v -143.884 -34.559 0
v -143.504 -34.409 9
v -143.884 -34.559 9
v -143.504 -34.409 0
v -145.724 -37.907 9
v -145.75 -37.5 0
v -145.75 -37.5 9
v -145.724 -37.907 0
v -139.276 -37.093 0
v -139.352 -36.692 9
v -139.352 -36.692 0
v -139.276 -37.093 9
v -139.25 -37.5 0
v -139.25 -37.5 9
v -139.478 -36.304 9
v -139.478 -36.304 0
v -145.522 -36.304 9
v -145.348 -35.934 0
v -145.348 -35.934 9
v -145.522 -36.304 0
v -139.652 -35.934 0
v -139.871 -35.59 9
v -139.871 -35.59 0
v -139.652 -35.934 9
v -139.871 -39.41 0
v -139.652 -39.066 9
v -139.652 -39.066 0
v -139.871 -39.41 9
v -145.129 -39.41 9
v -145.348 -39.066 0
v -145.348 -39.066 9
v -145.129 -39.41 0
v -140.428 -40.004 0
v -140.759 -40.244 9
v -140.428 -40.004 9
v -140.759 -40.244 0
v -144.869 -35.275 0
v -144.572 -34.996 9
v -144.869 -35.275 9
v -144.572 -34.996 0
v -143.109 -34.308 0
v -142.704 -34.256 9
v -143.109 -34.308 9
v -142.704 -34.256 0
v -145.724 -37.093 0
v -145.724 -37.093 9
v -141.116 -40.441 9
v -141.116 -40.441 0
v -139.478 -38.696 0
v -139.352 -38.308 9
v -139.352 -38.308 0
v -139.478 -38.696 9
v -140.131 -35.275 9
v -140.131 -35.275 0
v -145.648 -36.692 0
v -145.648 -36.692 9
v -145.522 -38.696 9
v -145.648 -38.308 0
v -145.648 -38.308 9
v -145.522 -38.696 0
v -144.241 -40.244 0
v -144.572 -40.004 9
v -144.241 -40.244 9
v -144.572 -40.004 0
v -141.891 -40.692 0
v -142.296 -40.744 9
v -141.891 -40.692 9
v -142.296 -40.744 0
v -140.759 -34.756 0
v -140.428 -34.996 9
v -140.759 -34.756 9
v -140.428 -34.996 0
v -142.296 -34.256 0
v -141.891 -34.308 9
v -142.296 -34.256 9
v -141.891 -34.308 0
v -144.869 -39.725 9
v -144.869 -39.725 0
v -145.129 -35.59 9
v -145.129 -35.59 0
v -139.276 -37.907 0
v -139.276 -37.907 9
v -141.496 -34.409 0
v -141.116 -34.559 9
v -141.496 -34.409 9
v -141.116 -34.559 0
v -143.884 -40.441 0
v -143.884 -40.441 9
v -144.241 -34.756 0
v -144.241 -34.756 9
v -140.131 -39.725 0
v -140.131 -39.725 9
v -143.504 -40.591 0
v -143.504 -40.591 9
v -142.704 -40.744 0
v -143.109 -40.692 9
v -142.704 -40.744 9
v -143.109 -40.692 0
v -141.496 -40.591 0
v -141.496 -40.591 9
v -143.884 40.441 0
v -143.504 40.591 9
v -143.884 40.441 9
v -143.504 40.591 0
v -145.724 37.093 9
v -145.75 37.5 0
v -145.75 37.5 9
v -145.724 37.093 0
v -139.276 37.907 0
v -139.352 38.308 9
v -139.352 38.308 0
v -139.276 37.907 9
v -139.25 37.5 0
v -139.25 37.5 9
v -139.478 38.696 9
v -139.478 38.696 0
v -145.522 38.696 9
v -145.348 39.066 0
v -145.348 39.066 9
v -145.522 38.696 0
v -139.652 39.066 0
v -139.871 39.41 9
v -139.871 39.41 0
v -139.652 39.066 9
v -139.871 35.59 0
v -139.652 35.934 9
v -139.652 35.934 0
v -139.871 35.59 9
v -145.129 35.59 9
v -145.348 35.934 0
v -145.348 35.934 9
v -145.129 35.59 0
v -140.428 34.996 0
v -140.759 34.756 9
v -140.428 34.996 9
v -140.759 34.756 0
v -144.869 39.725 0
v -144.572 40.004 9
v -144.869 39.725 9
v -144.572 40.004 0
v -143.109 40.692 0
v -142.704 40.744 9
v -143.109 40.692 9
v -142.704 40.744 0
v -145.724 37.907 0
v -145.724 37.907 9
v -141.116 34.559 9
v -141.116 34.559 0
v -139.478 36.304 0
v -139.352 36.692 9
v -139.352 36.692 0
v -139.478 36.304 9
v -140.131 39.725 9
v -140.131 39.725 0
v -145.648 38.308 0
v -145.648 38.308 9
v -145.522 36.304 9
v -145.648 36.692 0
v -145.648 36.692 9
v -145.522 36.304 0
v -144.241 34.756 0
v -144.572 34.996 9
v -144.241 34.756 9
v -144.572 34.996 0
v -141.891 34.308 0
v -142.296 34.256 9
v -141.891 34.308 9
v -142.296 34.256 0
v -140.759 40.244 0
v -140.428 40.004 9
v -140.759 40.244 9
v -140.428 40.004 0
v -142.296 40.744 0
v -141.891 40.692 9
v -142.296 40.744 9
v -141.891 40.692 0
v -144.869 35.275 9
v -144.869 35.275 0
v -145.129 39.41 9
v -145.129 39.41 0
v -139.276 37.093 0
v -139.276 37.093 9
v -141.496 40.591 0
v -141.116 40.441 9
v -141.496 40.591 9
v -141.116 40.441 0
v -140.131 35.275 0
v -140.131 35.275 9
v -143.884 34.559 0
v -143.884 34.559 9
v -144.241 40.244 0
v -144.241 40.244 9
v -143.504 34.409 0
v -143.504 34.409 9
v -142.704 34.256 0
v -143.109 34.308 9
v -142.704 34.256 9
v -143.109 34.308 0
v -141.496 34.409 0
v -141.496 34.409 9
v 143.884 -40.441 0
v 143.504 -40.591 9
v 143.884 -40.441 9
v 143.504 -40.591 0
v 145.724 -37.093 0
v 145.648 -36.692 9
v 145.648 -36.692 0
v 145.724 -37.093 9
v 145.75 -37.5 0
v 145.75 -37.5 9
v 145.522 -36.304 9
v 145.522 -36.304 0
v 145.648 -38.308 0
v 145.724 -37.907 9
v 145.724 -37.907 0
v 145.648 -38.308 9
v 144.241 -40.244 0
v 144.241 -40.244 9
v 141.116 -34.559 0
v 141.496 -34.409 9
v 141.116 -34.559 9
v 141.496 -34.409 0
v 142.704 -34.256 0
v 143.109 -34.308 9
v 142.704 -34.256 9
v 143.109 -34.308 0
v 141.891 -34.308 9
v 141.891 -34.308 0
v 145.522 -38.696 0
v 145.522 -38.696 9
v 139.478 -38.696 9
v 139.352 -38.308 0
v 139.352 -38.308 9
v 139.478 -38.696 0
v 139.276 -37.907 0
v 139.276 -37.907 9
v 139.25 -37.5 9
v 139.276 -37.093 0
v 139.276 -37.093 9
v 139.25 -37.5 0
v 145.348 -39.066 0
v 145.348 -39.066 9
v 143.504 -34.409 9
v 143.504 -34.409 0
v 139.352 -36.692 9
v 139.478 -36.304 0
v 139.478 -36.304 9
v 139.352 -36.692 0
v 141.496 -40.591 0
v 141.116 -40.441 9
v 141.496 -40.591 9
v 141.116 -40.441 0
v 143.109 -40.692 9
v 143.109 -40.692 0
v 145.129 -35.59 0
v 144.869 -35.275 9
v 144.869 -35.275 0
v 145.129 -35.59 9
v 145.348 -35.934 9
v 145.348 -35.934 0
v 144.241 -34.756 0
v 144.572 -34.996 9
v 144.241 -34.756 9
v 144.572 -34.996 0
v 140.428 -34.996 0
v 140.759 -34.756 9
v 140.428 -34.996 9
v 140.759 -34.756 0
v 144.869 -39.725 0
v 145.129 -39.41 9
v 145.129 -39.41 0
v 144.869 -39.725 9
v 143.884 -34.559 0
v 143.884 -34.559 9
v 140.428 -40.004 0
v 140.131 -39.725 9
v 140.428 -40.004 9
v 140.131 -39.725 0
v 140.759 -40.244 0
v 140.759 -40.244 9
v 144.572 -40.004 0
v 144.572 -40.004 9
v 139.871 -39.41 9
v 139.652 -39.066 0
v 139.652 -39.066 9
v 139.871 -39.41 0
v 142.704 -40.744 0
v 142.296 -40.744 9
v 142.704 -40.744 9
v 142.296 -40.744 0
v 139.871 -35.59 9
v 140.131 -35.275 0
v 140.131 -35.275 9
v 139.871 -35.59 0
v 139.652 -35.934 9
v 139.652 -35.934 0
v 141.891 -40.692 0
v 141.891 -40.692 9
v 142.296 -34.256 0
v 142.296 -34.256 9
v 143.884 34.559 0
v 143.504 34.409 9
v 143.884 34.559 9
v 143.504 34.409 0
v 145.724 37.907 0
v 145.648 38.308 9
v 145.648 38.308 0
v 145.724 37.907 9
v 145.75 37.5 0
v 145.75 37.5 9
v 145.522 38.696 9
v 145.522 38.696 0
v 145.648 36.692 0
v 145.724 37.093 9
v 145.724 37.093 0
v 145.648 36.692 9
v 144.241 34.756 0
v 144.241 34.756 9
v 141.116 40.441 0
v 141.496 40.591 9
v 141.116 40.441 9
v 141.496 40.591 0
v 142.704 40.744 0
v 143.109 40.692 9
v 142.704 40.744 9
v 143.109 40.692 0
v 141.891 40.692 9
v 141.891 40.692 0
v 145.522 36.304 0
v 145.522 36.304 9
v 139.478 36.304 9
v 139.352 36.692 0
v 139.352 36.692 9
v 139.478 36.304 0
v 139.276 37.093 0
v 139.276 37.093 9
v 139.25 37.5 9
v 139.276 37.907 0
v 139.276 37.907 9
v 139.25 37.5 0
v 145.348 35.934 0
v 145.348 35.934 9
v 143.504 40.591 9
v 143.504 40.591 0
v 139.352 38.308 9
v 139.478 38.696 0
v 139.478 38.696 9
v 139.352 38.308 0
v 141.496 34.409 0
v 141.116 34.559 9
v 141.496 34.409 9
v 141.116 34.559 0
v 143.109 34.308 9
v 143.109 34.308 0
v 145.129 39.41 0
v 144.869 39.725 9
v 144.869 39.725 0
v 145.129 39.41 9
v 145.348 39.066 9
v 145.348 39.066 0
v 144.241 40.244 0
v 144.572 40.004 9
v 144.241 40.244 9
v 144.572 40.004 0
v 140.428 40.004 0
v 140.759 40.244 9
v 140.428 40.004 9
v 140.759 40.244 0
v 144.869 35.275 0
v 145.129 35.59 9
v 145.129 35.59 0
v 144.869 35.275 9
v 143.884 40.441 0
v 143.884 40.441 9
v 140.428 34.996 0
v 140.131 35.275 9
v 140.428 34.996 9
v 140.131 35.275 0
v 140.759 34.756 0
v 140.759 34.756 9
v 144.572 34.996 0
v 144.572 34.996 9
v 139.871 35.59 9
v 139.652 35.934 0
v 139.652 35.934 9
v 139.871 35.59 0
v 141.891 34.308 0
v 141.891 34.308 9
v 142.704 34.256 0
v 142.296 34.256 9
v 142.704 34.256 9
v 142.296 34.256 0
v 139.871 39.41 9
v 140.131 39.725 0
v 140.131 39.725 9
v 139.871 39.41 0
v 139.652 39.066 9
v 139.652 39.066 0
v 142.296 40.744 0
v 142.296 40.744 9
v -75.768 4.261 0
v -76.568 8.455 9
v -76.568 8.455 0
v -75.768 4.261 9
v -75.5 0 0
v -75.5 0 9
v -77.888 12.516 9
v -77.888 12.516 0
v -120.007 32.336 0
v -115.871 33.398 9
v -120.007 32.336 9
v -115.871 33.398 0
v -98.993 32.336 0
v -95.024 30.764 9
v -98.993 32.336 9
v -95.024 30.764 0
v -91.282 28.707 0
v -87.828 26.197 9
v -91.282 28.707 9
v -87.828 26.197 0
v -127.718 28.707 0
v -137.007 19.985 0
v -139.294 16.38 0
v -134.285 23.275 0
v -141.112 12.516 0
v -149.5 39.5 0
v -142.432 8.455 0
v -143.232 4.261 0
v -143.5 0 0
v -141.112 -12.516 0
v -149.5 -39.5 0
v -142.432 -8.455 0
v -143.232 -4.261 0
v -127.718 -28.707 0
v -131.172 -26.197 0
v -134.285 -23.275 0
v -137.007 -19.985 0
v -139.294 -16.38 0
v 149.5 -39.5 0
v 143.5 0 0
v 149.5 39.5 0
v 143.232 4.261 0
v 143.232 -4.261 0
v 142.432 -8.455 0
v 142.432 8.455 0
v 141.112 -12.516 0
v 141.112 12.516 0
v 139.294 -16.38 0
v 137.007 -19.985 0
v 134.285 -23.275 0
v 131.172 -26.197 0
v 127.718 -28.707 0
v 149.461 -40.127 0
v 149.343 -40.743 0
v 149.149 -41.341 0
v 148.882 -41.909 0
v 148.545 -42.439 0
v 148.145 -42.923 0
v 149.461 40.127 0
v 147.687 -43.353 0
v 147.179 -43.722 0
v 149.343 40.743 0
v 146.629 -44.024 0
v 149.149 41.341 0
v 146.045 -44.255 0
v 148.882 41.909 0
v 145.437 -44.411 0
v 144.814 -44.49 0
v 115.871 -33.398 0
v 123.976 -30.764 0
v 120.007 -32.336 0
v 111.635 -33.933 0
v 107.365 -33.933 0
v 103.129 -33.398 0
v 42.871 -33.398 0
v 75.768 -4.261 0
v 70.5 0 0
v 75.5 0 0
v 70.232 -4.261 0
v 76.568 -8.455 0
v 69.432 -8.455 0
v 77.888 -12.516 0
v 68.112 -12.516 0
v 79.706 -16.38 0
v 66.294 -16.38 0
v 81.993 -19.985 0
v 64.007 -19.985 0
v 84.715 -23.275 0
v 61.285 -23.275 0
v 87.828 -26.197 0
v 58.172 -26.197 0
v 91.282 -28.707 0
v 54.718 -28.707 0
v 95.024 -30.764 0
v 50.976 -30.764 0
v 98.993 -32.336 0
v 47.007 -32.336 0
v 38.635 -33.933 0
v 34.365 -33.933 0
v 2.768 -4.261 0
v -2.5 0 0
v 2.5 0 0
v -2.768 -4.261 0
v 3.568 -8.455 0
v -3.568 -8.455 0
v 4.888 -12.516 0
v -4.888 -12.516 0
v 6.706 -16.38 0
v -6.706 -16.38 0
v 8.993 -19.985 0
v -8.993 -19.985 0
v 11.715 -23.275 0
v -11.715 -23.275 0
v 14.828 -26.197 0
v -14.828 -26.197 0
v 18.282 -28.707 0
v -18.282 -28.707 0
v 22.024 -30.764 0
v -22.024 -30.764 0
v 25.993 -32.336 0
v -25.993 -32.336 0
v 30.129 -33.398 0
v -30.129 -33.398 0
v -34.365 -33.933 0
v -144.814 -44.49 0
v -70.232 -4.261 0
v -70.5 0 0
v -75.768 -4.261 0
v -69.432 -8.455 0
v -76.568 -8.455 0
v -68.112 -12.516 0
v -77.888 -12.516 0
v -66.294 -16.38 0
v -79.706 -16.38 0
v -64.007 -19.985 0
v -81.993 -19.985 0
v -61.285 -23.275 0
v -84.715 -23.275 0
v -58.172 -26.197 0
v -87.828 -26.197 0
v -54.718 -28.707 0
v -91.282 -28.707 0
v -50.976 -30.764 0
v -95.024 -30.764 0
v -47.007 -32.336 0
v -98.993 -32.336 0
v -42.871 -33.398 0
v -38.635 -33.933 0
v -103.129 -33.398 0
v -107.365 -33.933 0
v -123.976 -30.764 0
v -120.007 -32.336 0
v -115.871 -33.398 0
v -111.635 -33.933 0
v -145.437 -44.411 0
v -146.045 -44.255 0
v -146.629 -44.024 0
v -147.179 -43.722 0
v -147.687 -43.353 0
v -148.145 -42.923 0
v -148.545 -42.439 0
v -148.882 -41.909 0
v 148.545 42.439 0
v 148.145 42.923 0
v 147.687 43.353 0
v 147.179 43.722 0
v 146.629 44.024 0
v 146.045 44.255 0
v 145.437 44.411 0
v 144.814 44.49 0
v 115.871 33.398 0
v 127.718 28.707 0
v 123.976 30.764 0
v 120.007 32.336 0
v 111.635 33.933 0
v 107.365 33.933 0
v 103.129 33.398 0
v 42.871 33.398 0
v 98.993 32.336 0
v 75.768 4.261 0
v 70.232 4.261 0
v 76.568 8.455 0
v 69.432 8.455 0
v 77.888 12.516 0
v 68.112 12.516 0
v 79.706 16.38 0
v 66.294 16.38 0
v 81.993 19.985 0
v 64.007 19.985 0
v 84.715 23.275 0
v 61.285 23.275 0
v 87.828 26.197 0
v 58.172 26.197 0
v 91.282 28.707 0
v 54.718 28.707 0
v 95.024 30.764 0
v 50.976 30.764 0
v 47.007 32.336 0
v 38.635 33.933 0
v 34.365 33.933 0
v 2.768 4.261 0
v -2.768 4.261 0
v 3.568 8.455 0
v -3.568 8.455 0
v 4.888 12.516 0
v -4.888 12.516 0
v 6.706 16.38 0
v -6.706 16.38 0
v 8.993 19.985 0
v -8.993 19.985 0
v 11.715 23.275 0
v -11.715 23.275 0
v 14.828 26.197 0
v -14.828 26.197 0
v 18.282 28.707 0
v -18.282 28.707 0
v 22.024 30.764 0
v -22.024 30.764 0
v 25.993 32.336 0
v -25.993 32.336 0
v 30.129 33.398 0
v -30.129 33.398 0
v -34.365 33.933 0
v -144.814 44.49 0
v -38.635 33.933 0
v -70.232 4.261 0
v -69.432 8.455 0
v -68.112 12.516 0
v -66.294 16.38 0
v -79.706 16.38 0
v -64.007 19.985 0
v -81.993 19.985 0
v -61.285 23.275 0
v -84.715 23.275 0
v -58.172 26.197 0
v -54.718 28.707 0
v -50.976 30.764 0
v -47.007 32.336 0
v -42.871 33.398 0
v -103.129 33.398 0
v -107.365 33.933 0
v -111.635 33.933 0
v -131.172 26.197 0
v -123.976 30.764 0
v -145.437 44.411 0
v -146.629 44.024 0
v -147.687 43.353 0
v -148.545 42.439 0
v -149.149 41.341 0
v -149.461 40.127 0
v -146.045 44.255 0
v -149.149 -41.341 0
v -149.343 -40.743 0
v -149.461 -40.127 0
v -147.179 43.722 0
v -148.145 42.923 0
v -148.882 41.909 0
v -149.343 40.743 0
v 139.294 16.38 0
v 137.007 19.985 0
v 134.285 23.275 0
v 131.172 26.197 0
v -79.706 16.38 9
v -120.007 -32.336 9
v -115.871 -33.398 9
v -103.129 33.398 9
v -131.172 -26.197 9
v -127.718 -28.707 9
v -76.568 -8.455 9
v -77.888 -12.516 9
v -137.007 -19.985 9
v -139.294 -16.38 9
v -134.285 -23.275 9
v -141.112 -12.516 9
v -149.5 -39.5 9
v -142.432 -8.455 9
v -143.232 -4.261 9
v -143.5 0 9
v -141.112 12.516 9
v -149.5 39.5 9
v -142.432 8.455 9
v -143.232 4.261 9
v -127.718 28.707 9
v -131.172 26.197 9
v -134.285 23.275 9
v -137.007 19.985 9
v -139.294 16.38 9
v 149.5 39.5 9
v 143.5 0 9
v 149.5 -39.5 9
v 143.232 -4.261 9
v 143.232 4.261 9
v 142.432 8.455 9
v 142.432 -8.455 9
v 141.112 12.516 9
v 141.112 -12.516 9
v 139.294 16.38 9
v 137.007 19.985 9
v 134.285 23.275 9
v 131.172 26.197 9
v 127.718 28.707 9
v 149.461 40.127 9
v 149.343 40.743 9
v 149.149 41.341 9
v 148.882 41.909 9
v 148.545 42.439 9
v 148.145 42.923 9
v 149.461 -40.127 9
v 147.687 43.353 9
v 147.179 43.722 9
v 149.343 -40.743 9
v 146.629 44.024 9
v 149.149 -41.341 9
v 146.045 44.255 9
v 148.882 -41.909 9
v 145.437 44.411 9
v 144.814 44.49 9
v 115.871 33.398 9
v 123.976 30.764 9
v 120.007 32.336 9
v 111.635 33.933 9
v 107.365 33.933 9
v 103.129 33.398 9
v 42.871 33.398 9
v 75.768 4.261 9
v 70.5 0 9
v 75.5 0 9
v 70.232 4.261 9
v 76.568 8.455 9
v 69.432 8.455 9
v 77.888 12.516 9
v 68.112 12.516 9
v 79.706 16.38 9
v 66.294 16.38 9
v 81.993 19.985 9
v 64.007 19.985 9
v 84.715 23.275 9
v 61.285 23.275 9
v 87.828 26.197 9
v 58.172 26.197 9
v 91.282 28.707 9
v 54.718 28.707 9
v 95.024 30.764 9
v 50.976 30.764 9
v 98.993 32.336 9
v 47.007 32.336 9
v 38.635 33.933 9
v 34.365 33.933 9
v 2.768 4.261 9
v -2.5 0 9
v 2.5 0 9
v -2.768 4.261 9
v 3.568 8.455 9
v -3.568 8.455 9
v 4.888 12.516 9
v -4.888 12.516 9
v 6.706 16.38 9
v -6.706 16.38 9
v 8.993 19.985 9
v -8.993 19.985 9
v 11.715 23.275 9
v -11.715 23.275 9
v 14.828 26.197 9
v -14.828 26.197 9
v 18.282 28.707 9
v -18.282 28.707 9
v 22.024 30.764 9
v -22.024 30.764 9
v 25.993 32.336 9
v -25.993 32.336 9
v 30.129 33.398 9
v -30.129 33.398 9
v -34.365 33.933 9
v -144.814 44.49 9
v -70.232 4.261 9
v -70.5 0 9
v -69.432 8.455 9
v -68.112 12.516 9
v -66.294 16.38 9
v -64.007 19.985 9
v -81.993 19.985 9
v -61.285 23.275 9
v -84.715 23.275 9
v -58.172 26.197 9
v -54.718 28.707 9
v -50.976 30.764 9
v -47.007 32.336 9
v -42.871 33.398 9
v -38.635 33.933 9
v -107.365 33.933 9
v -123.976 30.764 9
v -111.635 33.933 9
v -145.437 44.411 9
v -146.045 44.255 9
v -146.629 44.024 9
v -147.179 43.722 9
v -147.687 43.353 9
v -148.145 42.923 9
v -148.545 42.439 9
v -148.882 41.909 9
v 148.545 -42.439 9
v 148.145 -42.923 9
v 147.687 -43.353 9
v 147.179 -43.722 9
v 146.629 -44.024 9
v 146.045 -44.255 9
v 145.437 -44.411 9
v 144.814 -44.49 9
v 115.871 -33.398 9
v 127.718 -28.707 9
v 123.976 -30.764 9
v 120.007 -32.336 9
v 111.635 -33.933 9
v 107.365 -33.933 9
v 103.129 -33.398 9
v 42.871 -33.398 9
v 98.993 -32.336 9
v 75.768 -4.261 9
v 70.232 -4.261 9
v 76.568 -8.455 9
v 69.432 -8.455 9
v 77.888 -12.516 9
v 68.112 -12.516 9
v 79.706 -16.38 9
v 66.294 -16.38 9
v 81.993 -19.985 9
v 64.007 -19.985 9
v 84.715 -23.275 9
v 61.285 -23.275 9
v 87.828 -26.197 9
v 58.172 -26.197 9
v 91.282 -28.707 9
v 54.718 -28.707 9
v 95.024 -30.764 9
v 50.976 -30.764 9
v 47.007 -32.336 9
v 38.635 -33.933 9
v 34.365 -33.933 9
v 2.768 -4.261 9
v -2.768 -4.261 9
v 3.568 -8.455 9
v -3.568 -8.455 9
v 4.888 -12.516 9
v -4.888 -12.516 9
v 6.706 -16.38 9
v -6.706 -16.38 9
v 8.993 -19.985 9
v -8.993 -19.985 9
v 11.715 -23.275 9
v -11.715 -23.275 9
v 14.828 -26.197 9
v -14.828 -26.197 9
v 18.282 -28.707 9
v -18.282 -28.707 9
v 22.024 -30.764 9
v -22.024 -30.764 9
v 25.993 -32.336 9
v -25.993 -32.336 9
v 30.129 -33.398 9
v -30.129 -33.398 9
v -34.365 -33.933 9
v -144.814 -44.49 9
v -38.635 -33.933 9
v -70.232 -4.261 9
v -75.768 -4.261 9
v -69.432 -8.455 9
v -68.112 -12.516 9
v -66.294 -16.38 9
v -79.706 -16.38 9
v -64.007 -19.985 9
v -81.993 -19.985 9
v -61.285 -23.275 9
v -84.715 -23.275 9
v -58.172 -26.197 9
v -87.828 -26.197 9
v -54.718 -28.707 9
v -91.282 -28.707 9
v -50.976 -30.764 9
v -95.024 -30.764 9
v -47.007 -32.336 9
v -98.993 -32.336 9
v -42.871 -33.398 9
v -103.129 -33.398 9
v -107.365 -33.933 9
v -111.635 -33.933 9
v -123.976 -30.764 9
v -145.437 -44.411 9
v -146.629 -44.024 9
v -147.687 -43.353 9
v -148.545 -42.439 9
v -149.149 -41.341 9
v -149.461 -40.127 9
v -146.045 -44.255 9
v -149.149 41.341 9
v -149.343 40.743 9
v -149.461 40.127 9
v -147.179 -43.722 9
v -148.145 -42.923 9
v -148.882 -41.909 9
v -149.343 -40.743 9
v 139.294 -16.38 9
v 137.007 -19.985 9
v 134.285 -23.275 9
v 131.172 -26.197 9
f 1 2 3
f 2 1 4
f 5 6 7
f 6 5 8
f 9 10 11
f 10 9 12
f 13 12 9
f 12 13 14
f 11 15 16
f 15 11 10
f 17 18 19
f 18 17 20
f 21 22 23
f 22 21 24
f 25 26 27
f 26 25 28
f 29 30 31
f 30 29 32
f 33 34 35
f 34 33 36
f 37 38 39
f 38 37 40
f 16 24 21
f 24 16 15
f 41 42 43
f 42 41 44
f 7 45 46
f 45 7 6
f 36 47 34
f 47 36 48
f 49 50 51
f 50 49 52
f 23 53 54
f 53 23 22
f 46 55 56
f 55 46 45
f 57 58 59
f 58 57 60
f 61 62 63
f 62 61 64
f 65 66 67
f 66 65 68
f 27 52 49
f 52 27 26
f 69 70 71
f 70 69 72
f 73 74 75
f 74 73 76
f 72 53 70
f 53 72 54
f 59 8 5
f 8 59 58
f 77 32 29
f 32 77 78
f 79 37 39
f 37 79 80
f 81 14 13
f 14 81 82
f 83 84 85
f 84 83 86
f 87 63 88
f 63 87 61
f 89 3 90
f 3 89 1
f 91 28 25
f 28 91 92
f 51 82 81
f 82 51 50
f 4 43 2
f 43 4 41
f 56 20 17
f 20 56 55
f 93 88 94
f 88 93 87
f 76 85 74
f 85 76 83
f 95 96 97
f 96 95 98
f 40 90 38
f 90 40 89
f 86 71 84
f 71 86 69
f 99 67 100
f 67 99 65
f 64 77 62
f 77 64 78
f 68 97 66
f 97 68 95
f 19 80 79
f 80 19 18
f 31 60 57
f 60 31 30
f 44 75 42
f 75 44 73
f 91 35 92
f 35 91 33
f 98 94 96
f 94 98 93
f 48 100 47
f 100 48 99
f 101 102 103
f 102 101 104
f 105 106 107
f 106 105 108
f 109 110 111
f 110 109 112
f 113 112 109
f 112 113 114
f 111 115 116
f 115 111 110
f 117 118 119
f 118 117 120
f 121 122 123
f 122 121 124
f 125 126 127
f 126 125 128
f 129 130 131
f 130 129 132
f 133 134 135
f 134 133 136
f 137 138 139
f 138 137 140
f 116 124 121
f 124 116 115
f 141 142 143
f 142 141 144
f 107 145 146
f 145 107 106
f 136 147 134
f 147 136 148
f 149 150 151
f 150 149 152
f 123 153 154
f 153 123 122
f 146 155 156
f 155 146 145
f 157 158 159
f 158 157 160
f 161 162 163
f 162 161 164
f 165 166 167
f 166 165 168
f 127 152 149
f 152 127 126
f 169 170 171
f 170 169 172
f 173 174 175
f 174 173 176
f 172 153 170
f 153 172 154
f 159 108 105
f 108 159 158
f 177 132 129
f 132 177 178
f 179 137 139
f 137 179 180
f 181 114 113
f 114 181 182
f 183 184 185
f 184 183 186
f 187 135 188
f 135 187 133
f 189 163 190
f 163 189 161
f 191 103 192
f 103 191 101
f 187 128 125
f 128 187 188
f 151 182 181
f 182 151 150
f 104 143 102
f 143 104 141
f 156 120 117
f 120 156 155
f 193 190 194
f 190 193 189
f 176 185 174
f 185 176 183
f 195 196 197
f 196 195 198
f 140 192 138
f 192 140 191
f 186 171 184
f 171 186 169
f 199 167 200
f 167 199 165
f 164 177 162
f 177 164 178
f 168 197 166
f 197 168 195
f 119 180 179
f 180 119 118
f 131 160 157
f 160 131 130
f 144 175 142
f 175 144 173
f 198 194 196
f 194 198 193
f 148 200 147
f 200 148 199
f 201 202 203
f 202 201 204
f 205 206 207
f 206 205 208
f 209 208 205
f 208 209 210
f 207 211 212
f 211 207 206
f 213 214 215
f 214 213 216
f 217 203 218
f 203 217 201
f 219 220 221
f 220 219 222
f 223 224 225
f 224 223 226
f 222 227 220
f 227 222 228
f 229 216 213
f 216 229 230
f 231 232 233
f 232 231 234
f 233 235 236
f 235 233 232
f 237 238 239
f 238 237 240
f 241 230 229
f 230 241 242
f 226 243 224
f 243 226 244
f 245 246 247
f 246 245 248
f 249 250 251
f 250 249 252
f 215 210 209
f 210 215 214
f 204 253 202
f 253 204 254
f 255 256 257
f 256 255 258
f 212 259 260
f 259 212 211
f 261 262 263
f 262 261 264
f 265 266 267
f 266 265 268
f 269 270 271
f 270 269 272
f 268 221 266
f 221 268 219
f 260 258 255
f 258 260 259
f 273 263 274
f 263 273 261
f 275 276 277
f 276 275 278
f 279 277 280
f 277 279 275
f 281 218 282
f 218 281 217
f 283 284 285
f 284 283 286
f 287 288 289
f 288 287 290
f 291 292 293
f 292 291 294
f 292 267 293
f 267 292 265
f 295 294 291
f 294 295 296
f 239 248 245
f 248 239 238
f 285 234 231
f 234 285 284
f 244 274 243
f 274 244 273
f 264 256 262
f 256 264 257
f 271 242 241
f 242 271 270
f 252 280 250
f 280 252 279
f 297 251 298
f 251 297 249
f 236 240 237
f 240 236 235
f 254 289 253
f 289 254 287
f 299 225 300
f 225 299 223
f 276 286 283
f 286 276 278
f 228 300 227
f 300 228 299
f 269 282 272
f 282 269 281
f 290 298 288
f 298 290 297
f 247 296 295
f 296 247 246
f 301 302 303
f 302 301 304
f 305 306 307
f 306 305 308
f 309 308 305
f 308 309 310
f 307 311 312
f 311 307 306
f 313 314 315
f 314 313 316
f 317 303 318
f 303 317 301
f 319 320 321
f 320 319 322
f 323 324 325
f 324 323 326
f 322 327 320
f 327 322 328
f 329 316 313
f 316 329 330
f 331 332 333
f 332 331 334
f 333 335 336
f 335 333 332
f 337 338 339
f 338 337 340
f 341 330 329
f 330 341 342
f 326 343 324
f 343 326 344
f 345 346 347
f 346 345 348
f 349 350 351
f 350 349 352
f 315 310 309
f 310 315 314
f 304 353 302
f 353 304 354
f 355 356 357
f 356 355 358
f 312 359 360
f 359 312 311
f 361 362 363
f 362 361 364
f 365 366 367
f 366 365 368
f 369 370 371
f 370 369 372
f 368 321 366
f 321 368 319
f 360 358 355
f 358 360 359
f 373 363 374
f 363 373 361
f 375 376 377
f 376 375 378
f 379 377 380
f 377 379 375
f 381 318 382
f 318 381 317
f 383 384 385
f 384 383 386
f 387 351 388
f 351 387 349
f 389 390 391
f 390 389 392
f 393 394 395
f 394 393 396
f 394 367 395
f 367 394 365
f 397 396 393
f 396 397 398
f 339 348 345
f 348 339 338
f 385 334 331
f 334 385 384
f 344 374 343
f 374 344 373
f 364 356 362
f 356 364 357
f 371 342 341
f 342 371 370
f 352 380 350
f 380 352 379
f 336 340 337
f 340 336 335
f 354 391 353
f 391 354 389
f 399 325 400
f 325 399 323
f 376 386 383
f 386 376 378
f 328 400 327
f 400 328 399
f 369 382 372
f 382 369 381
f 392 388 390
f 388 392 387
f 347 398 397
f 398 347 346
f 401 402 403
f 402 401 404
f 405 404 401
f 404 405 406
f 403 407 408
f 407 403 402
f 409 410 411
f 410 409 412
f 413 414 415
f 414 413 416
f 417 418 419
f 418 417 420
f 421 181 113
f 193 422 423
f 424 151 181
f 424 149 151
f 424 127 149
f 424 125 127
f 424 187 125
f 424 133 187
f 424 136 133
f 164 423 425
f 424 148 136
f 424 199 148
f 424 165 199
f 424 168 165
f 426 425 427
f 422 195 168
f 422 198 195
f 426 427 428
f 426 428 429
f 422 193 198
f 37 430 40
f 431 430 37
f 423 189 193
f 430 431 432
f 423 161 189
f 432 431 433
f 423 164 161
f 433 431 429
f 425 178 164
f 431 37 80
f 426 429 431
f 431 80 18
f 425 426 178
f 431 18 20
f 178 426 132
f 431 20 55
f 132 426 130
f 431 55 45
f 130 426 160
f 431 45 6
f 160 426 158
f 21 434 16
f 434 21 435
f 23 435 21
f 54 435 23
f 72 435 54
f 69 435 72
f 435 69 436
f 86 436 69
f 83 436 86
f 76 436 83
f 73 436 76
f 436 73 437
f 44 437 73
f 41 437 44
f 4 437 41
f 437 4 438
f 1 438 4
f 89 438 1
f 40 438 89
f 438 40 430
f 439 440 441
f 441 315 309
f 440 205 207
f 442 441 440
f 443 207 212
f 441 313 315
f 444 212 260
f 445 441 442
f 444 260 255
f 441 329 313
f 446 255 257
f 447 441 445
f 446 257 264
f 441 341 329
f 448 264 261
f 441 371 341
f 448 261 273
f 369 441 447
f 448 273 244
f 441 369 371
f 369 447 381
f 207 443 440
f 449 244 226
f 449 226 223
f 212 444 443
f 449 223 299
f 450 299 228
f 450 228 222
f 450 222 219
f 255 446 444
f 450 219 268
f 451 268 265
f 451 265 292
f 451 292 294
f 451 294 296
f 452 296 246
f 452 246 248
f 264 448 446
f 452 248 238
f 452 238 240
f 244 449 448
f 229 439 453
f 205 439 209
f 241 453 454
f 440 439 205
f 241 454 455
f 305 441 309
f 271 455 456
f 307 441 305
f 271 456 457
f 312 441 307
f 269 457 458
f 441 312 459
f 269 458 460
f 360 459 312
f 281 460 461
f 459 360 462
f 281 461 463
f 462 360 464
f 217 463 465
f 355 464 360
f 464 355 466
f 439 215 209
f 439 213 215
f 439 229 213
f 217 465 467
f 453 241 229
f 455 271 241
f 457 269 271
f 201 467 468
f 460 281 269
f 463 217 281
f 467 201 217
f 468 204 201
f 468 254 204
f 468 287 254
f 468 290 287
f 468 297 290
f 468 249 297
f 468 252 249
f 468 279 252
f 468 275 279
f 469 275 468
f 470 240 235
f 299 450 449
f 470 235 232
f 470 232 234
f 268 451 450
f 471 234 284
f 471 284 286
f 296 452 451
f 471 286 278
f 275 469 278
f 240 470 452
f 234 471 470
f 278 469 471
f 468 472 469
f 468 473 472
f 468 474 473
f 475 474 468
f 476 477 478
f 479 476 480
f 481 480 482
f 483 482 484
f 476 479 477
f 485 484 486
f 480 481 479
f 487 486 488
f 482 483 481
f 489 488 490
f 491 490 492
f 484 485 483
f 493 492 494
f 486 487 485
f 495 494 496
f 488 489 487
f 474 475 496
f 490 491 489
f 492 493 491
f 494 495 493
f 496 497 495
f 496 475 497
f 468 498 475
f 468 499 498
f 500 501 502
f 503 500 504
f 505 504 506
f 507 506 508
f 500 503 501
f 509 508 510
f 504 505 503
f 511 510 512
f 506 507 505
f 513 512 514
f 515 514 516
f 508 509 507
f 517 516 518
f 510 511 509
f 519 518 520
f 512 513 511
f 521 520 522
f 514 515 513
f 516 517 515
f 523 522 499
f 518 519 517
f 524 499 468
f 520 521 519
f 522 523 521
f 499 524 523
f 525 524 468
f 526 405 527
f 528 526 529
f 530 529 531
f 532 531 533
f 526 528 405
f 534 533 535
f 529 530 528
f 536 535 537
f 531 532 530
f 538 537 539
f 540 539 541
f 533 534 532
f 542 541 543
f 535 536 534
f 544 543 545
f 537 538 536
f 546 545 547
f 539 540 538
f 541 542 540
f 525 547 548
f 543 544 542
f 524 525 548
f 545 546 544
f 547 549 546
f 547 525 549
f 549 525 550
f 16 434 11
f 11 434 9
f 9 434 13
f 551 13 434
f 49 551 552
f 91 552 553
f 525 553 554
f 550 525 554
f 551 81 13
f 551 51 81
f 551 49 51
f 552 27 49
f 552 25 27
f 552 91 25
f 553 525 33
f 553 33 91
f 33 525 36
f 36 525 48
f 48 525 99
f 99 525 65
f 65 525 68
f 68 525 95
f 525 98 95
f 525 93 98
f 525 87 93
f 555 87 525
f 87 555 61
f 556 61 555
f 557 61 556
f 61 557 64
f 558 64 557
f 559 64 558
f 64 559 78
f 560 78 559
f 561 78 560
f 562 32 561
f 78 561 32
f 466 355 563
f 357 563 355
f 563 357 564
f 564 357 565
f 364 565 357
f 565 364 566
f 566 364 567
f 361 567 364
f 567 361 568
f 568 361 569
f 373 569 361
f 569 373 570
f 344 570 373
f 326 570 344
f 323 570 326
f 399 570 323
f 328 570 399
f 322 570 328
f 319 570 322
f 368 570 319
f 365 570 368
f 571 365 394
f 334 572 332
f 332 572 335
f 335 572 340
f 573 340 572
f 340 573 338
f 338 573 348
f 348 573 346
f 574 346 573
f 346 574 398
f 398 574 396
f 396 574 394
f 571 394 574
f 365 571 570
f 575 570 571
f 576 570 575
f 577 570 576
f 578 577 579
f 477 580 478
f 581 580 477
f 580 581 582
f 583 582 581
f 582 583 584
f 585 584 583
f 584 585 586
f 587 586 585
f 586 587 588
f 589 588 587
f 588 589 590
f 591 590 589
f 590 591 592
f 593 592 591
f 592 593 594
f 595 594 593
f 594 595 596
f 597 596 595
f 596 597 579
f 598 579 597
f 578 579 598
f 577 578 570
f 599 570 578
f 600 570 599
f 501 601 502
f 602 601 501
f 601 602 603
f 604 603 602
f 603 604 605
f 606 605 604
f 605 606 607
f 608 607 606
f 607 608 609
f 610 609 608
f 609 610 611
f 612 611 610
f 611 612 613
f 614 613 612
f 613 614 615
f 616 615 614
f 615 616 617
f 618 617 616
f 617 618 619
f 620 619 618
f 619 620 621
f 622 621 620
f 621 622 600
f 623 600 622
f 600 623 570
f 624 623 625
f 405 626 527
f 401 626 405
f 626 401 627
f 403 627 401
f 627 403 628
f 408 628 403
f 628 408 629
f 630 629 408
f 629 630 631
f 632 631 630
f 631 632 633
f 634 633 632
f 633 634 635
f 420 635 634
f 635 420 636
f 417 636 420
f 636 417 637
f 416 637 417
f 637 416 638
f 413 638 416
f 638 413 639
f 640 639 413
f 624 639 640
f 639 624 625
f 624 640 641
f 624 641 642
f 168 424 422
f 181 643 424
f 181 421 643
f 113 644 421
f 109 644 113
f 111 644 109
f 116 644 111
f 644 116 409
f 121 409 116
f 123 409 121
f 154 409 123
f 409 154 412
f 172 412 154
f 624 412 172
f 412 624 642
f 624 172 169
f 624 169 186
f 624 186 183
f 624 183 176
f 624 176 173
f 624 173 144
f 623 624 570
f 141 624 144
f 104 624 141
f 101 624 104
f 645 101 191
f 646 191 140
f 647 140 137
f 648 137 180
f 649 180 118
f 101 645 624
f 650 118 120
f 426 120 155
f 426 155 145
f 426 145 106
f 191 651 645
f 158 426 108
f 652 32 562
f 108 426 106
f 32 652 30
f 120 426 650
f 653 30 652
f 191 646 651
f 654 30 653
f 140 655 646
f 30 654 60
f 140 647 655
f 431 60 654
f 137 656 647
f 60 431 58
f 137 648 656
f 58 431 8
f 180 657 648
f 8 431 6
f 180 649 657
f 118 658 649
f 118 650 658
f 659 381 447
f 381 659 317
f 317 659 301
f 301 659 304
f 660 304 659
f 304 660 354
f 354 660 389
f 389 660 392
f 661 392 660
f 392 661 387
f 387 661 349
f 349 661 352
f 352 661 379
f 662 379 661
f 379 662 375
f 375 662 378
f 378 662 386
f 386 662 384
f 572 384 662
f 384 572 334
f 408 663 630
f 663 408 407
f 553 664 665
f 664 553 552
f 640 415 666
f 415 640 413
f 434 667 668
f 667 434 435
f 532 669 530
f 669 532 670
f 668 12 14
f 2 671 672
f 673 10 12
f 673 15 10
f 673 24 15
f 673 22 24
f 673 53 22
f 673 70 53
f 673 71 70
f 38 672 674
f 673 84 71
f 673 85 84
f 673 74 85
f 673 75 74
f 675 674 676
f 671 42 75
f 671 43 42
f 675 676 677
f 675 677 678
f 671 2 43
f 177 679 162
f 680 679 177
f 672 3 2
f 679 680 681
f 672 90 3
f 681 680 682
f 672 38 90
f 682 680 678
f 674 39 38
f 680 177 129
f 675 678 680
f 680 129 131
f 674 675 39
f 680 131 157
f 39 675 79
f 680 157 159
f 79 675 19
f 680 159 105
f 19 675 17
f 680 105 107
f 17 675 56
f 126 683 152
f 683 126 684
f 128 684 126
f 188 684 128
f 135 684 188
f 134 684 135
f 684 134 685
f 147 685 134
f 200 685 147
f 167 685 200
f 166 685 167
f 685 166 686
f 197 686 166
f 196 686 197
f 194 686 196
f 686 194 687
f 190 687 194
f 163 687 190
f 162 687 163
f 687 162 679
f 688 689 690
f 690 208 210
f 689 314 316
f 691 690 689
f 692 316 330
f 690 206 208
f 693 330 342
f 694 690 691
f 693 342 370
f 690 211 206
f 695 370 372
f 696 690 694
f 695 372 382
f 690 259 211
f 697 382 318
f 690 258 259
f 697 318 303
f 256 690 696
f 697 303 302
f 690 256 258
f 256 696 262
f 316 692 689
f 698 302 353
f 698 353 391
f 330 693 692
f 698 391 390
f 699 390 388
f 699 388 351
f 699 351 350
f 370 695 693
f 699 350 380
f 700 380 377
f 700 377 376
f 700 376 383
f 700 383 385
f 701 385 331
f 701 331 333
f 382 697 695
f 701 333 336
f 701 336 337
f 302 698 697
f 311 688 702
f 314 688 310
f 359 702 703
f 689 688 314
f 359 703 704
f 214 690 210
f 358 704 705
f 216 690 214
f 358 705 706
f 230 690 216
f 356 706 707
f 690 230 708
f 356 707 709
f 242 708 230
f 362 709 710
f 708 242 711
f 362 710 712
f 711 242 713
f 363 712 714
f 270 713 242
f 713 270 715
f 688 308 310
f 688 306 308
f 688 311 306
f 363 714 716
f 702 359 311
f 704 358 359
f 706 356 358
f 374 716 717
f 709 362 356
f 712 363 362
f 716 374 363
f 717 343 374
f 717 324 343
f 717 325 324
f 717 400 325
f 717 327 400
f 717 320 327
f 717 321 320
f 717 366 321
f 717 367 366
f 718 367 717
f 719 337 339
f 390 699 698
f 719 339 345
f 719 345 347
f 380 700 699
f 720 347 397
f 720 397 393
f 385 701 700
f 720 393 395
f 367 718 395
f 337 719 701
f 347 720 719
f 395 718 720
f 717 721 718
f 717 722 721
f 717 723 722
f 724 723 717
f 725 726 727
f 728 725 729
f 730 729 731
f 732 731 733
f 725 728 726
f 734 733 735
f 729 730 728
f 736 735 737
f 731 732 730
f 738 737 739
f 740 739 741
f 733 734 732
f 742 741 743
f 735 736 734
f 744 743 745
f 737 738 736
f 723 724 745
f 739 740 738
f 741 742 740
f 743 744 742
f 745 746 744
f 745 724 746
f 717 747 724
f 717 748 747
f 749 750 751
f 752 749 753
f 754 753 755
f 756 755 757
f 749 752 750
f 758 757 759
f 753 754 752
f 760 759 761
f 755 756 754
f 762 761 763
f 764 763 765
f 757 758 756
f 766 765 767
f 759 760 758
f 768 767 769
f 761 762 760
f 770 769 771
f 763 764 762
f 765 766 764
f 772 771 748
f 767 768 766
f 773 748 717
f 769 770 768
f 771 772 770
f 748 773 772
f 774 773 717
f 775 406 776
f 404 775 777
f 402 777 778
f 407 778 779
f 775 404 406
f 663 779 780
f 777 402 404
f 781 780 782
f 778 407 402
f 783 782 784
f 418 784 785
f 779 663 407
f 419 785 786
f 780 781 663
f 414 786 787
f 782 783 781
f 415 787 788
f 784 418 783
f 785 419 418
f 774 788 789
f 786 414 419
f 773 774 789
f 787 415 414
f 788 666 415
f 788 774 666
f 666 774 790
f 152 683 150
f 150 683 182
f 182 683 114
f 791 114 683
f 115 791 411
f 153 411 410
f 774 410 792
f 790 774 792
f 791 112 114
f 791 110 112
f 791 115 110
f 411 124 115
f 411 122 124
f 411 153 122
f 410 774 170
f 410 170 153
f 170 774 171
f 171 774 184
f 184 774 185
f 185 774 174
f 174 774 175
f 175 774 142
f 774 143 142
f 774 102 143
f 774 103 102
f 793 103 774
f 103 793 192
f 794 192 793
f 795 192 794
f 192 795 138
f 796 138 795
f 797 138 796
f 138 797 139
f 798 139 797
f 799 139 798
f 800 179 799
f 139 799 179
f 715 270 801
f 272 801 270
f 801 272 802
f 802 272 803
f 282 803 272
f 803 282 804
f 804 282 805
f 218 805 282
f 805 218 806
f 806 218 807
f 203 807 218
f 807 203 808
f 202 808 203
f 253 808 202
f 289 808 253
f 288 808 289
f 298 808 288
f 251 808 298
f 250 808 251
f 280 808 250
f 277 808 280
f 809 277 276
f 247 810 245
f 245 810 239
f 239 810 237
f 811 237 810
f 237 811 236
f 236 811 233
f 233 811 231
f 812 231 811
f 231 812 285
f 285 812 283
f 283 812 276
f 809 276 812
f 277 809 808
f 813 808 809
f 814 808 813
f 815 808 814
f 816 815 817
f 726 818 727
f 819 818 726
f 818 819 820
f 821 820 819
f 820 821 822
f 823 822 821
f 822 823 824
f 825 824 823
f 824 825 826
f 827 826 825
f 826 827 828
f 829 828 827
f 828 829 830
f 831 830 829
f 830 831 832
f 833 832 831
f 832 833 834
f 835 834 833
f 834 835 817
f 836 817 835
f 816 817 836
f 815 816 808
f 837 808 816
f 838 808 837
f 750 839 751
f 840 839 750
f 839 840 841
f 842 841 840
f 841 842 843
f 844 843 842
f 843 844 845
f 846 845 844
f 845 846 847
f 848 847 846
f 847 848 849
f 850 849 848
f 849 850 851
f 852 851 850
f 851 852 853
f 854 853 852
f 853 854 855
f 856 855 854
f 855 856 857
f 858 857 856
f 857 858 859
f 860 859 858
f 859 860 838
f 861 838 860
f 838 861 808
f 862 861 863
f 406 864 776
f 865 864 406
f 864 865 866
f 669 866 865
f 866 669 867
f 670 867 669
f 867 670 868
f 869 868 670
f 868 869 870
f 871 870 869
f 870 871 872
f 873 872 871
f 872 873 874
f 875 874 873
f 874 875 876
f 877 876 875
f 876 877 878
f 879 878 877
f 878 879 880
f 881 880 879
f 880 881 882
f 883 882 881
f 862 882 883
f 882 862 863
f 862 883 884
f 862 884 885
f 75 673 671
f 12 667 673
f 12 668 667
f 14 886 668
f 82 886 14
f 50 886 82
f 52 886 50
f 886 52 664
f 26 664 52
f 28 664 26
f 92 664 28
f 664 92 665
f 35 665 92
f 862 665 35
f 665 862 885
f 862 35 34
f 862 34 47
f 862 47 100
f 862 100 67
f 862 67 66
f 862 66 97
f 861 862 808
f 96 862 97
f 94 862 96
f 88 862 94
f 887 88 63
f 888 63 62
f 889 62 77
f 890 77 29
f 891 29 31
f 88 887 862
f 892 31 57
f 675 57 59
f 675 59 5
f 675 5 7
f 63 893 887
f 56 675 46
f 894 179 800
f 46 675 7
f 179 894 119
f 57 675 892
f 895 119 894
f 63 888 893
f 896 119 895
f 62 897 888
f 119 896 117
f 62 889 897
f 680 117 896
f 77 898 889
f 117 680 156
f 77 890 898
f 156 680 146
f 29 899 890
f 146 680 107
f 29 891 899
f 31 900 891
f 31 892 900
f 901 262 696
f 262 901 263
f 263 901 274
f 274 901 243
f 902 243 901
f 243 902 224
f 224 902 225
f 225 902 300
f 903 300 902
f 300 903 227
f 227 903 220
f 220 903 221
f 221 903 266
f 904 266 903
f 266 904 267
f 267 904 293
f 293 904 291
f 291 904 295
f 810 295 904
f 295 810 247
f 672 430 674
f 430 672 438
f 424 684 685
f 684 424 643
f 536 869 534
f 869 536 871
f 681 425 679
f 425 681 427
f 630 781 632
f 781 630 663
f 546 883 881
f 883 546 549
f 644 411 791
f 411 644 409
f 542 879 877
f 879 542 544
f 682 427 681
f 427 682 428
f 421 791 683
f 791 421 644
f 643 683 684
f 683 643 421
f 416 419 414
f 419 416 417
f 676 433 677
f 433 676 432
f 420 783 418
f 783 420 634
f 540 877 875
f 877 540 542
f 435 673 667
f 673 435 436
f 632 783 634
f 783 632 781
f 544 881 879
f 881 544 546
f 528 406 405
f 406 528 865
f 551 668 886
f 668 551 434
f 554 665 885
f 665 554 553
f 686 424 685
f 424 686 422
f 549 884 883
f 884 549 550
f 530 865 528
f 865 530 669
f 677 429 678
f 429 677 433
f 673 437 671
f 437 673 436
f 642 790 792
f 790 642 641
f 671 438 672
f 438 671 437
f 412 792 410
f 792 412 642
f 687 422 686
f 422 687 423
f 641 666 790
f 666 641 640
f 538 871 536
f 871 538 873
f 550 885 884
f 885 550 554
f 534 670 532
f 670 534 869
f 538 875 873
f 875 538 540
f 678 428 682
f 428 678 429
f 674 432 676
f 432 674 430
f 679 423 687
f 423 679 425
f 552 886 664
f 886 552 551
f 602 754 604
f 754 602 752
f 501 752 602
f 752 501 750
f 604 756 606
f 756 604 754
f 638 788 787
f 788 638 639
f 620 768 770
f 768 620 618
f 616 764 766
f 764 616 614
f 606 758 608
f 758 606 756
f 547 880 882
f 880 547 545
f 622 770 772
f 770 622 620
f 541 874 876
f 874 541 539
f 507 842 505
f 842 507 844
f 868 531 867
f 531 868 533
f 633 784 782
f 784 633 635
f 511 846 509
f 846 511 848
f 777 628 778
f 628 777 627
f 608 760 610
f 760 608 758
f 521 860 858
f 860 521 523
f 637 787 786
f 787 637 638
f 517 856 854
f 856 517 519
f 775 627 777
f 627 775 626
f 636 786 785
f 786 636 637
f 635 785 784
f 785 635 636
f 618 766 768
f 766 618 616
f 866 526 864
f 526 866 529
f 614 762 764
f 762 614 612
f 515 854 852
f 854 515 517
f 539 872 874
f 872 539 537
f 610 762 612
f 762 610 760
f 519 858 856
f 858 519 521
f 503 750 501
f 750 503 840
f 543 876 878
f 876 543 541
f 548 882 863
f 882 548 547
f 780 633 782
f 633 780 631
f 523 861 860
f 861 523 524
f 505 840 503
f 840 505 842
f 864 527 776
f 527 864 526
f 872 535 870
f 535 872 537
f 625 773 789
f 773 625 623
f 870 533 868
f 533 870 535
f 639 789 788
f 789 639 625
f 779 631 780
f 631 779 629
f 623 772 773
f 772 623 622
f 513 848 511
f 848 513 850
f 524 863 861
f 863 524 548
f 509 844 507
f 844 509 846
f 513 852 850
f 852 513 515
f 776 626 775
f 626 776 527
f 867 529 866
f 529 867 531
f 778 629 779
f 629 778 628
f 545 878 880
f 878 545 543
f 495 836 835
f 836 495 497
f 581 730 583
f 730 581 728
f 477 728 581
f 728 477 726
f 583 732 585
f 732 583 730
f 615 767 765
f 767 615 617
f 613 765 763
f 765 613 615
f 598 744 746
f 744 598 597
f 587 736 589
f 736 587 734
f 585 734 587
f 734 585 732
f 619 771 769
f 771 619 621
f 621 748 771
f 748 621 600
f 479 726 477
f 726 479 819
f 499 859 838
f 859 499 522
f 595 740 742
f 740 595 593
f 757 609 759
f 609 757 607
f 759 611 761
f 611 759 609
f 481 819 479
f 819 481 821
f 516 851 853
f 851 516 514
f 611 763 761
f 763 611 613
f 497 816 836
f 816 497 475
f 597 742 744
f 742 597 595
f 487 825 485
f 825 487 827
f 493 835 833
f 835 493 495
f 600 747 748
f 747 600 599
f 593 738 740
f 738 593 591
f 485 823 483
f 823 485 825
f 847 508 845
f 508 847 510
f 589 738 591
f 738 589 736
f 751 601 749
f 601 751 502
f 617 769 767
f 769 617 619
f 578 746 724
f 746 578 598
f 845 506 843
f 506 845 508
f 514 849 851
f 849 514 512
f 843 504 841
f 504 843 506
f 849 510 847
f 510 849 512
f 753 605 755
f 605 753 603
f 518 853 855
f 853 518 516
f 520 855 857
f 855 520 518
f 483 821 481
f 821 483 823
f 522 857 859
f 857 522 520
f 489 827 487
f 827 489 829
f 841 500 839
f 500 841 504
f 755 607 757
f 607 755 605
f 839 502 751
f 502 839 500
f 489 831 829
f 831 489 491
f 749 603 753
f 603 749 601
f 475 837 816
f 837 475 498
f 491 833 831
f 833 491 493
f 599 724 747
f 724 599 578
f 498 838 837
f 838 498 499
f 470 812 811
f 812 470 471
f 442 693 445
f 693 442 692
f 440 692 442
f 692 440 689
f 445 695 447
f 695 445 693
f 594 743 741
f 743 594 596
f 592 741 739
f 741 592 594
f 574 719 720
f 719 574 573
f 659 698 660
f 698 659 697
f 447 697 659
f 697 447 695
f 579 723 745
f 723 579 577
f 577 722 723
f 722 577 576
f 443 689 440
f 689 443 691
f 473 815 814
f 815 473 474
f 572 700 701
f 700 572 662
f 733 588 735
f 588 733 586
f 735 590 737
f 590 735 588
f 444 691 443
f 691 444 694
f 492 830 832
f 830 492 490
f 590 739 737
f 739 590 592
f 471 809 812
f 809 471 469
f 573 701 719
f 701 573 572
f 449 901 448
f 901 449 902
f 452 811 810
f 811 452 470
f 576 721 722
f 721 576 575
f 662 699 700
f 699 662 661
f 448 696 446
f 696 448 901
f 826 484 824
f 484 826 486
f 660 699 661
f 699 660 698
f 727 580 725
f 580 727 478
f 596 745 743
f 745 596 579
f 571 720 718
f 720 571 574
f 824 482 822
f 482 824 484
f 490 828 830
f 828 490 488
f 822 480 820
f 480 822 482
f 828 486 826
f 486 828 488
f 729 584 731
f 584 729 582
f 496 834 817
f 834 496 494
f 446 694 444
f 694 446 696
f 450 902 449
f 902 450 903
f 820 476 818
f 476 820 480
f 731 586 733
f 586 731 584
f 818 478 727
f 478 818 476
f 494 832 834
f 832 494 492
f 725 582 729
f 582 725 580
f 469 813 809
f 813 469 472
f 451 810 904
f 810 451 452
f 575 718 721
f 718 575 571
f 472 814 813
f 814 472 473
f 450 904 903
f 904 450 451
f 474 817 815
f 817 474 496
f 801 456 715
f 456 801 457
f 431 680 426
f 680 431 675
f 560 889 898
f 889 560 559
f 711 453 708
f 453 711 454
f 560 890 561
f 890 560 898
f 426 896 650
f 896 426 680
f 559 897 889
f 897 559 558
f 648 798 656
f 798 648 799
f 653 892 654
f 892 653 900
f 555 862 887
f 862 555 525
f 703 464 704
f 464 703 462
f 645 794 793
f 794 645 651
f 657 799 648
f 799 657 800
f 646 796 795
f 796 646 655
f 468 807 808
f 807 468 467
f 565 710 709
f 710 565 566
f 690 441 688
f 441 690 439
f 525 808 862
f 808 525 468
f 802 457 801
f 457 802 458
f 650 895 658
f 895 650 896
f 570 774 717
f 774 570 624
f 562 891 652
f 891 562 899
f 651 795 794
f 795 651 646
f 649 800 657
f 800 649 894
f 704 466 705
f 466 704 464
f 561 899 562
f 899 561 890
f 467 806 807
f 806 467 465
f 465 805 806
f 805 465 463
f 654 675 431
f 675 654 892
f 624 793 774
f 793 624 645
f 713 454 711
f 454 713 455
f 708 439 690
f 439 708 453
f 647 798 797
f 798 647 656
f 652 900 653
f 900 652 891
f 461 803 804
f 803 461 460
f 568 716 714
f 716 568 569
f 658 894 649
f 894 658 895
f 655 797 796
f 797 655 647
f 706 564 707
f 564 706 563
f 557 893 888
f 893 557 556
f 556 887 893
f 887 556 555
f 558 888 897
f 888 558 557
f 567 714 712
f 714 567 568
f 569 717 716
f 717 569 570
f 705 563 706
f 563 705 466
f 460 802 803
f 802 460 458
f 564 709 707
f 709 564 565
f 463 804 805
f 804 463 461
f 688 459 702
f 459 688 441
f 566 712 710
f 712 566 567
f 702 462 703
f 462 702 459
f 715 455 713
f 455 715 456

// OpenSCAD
$fn = 50;


difference() {
	union() {
		hull() {
			translate(v = [-144.5000000000, 39.5000000000, 0]) {
				cylinder(h = 9, r = 5);
			}
			translate(v = [144.5000000000, 39.5000000000, 0]) {
				cylinder(h = 9, r = 5);
			}
			translate(v = [-144.5000000000, -39.5000000000, 0]) {
				cylinder(h = 9, r = 5);
			}
			translate(v = [144.5000000000, -39.5000000000, 0]) {
				cylinder(h = 9, r = 5);
			}
		}
	}
	union() {
		#translate(v = [-142.5000000000, -37.5000000000, -100.0000000000]) {
			cylinder(h = 200, r = 3.2500000000);
		}
		#translate(v = [-142.5000000000, 37.5000000000, -100.0000000000]) {
			cylinder(h = 200, r = 3.2500000000);
		}
		#translate(v = [142.5000000000, -37.5000000000, -100.0000000000]) {
			cylinder(h = 200, r = 3.2500000000);
		}
		#translate(v = [142.5000000000, 37.5000000000, -100.0000000000]) {
			cylinder(h = 200, r = 3.2500000000);
		}
		#translate(v = [-109.5000000000, 0, 0]) {
			cylinder(h = 9, r = 34.0000000000);
		}
		#translate(v = [-36.5000000000, 0, 0]) {
			cylinder(h = 9, r = 34.0000000000);
		}
		#translate(v = [36.5000000000, 0, 0]) {
			cylinder(h = 9, r = 34.0000000000);
		}
		#translate(v = [109.5000000000, 0, 0]) {
			cylinder(h = 9, r = 34.0000000000);
		}
	}
}
